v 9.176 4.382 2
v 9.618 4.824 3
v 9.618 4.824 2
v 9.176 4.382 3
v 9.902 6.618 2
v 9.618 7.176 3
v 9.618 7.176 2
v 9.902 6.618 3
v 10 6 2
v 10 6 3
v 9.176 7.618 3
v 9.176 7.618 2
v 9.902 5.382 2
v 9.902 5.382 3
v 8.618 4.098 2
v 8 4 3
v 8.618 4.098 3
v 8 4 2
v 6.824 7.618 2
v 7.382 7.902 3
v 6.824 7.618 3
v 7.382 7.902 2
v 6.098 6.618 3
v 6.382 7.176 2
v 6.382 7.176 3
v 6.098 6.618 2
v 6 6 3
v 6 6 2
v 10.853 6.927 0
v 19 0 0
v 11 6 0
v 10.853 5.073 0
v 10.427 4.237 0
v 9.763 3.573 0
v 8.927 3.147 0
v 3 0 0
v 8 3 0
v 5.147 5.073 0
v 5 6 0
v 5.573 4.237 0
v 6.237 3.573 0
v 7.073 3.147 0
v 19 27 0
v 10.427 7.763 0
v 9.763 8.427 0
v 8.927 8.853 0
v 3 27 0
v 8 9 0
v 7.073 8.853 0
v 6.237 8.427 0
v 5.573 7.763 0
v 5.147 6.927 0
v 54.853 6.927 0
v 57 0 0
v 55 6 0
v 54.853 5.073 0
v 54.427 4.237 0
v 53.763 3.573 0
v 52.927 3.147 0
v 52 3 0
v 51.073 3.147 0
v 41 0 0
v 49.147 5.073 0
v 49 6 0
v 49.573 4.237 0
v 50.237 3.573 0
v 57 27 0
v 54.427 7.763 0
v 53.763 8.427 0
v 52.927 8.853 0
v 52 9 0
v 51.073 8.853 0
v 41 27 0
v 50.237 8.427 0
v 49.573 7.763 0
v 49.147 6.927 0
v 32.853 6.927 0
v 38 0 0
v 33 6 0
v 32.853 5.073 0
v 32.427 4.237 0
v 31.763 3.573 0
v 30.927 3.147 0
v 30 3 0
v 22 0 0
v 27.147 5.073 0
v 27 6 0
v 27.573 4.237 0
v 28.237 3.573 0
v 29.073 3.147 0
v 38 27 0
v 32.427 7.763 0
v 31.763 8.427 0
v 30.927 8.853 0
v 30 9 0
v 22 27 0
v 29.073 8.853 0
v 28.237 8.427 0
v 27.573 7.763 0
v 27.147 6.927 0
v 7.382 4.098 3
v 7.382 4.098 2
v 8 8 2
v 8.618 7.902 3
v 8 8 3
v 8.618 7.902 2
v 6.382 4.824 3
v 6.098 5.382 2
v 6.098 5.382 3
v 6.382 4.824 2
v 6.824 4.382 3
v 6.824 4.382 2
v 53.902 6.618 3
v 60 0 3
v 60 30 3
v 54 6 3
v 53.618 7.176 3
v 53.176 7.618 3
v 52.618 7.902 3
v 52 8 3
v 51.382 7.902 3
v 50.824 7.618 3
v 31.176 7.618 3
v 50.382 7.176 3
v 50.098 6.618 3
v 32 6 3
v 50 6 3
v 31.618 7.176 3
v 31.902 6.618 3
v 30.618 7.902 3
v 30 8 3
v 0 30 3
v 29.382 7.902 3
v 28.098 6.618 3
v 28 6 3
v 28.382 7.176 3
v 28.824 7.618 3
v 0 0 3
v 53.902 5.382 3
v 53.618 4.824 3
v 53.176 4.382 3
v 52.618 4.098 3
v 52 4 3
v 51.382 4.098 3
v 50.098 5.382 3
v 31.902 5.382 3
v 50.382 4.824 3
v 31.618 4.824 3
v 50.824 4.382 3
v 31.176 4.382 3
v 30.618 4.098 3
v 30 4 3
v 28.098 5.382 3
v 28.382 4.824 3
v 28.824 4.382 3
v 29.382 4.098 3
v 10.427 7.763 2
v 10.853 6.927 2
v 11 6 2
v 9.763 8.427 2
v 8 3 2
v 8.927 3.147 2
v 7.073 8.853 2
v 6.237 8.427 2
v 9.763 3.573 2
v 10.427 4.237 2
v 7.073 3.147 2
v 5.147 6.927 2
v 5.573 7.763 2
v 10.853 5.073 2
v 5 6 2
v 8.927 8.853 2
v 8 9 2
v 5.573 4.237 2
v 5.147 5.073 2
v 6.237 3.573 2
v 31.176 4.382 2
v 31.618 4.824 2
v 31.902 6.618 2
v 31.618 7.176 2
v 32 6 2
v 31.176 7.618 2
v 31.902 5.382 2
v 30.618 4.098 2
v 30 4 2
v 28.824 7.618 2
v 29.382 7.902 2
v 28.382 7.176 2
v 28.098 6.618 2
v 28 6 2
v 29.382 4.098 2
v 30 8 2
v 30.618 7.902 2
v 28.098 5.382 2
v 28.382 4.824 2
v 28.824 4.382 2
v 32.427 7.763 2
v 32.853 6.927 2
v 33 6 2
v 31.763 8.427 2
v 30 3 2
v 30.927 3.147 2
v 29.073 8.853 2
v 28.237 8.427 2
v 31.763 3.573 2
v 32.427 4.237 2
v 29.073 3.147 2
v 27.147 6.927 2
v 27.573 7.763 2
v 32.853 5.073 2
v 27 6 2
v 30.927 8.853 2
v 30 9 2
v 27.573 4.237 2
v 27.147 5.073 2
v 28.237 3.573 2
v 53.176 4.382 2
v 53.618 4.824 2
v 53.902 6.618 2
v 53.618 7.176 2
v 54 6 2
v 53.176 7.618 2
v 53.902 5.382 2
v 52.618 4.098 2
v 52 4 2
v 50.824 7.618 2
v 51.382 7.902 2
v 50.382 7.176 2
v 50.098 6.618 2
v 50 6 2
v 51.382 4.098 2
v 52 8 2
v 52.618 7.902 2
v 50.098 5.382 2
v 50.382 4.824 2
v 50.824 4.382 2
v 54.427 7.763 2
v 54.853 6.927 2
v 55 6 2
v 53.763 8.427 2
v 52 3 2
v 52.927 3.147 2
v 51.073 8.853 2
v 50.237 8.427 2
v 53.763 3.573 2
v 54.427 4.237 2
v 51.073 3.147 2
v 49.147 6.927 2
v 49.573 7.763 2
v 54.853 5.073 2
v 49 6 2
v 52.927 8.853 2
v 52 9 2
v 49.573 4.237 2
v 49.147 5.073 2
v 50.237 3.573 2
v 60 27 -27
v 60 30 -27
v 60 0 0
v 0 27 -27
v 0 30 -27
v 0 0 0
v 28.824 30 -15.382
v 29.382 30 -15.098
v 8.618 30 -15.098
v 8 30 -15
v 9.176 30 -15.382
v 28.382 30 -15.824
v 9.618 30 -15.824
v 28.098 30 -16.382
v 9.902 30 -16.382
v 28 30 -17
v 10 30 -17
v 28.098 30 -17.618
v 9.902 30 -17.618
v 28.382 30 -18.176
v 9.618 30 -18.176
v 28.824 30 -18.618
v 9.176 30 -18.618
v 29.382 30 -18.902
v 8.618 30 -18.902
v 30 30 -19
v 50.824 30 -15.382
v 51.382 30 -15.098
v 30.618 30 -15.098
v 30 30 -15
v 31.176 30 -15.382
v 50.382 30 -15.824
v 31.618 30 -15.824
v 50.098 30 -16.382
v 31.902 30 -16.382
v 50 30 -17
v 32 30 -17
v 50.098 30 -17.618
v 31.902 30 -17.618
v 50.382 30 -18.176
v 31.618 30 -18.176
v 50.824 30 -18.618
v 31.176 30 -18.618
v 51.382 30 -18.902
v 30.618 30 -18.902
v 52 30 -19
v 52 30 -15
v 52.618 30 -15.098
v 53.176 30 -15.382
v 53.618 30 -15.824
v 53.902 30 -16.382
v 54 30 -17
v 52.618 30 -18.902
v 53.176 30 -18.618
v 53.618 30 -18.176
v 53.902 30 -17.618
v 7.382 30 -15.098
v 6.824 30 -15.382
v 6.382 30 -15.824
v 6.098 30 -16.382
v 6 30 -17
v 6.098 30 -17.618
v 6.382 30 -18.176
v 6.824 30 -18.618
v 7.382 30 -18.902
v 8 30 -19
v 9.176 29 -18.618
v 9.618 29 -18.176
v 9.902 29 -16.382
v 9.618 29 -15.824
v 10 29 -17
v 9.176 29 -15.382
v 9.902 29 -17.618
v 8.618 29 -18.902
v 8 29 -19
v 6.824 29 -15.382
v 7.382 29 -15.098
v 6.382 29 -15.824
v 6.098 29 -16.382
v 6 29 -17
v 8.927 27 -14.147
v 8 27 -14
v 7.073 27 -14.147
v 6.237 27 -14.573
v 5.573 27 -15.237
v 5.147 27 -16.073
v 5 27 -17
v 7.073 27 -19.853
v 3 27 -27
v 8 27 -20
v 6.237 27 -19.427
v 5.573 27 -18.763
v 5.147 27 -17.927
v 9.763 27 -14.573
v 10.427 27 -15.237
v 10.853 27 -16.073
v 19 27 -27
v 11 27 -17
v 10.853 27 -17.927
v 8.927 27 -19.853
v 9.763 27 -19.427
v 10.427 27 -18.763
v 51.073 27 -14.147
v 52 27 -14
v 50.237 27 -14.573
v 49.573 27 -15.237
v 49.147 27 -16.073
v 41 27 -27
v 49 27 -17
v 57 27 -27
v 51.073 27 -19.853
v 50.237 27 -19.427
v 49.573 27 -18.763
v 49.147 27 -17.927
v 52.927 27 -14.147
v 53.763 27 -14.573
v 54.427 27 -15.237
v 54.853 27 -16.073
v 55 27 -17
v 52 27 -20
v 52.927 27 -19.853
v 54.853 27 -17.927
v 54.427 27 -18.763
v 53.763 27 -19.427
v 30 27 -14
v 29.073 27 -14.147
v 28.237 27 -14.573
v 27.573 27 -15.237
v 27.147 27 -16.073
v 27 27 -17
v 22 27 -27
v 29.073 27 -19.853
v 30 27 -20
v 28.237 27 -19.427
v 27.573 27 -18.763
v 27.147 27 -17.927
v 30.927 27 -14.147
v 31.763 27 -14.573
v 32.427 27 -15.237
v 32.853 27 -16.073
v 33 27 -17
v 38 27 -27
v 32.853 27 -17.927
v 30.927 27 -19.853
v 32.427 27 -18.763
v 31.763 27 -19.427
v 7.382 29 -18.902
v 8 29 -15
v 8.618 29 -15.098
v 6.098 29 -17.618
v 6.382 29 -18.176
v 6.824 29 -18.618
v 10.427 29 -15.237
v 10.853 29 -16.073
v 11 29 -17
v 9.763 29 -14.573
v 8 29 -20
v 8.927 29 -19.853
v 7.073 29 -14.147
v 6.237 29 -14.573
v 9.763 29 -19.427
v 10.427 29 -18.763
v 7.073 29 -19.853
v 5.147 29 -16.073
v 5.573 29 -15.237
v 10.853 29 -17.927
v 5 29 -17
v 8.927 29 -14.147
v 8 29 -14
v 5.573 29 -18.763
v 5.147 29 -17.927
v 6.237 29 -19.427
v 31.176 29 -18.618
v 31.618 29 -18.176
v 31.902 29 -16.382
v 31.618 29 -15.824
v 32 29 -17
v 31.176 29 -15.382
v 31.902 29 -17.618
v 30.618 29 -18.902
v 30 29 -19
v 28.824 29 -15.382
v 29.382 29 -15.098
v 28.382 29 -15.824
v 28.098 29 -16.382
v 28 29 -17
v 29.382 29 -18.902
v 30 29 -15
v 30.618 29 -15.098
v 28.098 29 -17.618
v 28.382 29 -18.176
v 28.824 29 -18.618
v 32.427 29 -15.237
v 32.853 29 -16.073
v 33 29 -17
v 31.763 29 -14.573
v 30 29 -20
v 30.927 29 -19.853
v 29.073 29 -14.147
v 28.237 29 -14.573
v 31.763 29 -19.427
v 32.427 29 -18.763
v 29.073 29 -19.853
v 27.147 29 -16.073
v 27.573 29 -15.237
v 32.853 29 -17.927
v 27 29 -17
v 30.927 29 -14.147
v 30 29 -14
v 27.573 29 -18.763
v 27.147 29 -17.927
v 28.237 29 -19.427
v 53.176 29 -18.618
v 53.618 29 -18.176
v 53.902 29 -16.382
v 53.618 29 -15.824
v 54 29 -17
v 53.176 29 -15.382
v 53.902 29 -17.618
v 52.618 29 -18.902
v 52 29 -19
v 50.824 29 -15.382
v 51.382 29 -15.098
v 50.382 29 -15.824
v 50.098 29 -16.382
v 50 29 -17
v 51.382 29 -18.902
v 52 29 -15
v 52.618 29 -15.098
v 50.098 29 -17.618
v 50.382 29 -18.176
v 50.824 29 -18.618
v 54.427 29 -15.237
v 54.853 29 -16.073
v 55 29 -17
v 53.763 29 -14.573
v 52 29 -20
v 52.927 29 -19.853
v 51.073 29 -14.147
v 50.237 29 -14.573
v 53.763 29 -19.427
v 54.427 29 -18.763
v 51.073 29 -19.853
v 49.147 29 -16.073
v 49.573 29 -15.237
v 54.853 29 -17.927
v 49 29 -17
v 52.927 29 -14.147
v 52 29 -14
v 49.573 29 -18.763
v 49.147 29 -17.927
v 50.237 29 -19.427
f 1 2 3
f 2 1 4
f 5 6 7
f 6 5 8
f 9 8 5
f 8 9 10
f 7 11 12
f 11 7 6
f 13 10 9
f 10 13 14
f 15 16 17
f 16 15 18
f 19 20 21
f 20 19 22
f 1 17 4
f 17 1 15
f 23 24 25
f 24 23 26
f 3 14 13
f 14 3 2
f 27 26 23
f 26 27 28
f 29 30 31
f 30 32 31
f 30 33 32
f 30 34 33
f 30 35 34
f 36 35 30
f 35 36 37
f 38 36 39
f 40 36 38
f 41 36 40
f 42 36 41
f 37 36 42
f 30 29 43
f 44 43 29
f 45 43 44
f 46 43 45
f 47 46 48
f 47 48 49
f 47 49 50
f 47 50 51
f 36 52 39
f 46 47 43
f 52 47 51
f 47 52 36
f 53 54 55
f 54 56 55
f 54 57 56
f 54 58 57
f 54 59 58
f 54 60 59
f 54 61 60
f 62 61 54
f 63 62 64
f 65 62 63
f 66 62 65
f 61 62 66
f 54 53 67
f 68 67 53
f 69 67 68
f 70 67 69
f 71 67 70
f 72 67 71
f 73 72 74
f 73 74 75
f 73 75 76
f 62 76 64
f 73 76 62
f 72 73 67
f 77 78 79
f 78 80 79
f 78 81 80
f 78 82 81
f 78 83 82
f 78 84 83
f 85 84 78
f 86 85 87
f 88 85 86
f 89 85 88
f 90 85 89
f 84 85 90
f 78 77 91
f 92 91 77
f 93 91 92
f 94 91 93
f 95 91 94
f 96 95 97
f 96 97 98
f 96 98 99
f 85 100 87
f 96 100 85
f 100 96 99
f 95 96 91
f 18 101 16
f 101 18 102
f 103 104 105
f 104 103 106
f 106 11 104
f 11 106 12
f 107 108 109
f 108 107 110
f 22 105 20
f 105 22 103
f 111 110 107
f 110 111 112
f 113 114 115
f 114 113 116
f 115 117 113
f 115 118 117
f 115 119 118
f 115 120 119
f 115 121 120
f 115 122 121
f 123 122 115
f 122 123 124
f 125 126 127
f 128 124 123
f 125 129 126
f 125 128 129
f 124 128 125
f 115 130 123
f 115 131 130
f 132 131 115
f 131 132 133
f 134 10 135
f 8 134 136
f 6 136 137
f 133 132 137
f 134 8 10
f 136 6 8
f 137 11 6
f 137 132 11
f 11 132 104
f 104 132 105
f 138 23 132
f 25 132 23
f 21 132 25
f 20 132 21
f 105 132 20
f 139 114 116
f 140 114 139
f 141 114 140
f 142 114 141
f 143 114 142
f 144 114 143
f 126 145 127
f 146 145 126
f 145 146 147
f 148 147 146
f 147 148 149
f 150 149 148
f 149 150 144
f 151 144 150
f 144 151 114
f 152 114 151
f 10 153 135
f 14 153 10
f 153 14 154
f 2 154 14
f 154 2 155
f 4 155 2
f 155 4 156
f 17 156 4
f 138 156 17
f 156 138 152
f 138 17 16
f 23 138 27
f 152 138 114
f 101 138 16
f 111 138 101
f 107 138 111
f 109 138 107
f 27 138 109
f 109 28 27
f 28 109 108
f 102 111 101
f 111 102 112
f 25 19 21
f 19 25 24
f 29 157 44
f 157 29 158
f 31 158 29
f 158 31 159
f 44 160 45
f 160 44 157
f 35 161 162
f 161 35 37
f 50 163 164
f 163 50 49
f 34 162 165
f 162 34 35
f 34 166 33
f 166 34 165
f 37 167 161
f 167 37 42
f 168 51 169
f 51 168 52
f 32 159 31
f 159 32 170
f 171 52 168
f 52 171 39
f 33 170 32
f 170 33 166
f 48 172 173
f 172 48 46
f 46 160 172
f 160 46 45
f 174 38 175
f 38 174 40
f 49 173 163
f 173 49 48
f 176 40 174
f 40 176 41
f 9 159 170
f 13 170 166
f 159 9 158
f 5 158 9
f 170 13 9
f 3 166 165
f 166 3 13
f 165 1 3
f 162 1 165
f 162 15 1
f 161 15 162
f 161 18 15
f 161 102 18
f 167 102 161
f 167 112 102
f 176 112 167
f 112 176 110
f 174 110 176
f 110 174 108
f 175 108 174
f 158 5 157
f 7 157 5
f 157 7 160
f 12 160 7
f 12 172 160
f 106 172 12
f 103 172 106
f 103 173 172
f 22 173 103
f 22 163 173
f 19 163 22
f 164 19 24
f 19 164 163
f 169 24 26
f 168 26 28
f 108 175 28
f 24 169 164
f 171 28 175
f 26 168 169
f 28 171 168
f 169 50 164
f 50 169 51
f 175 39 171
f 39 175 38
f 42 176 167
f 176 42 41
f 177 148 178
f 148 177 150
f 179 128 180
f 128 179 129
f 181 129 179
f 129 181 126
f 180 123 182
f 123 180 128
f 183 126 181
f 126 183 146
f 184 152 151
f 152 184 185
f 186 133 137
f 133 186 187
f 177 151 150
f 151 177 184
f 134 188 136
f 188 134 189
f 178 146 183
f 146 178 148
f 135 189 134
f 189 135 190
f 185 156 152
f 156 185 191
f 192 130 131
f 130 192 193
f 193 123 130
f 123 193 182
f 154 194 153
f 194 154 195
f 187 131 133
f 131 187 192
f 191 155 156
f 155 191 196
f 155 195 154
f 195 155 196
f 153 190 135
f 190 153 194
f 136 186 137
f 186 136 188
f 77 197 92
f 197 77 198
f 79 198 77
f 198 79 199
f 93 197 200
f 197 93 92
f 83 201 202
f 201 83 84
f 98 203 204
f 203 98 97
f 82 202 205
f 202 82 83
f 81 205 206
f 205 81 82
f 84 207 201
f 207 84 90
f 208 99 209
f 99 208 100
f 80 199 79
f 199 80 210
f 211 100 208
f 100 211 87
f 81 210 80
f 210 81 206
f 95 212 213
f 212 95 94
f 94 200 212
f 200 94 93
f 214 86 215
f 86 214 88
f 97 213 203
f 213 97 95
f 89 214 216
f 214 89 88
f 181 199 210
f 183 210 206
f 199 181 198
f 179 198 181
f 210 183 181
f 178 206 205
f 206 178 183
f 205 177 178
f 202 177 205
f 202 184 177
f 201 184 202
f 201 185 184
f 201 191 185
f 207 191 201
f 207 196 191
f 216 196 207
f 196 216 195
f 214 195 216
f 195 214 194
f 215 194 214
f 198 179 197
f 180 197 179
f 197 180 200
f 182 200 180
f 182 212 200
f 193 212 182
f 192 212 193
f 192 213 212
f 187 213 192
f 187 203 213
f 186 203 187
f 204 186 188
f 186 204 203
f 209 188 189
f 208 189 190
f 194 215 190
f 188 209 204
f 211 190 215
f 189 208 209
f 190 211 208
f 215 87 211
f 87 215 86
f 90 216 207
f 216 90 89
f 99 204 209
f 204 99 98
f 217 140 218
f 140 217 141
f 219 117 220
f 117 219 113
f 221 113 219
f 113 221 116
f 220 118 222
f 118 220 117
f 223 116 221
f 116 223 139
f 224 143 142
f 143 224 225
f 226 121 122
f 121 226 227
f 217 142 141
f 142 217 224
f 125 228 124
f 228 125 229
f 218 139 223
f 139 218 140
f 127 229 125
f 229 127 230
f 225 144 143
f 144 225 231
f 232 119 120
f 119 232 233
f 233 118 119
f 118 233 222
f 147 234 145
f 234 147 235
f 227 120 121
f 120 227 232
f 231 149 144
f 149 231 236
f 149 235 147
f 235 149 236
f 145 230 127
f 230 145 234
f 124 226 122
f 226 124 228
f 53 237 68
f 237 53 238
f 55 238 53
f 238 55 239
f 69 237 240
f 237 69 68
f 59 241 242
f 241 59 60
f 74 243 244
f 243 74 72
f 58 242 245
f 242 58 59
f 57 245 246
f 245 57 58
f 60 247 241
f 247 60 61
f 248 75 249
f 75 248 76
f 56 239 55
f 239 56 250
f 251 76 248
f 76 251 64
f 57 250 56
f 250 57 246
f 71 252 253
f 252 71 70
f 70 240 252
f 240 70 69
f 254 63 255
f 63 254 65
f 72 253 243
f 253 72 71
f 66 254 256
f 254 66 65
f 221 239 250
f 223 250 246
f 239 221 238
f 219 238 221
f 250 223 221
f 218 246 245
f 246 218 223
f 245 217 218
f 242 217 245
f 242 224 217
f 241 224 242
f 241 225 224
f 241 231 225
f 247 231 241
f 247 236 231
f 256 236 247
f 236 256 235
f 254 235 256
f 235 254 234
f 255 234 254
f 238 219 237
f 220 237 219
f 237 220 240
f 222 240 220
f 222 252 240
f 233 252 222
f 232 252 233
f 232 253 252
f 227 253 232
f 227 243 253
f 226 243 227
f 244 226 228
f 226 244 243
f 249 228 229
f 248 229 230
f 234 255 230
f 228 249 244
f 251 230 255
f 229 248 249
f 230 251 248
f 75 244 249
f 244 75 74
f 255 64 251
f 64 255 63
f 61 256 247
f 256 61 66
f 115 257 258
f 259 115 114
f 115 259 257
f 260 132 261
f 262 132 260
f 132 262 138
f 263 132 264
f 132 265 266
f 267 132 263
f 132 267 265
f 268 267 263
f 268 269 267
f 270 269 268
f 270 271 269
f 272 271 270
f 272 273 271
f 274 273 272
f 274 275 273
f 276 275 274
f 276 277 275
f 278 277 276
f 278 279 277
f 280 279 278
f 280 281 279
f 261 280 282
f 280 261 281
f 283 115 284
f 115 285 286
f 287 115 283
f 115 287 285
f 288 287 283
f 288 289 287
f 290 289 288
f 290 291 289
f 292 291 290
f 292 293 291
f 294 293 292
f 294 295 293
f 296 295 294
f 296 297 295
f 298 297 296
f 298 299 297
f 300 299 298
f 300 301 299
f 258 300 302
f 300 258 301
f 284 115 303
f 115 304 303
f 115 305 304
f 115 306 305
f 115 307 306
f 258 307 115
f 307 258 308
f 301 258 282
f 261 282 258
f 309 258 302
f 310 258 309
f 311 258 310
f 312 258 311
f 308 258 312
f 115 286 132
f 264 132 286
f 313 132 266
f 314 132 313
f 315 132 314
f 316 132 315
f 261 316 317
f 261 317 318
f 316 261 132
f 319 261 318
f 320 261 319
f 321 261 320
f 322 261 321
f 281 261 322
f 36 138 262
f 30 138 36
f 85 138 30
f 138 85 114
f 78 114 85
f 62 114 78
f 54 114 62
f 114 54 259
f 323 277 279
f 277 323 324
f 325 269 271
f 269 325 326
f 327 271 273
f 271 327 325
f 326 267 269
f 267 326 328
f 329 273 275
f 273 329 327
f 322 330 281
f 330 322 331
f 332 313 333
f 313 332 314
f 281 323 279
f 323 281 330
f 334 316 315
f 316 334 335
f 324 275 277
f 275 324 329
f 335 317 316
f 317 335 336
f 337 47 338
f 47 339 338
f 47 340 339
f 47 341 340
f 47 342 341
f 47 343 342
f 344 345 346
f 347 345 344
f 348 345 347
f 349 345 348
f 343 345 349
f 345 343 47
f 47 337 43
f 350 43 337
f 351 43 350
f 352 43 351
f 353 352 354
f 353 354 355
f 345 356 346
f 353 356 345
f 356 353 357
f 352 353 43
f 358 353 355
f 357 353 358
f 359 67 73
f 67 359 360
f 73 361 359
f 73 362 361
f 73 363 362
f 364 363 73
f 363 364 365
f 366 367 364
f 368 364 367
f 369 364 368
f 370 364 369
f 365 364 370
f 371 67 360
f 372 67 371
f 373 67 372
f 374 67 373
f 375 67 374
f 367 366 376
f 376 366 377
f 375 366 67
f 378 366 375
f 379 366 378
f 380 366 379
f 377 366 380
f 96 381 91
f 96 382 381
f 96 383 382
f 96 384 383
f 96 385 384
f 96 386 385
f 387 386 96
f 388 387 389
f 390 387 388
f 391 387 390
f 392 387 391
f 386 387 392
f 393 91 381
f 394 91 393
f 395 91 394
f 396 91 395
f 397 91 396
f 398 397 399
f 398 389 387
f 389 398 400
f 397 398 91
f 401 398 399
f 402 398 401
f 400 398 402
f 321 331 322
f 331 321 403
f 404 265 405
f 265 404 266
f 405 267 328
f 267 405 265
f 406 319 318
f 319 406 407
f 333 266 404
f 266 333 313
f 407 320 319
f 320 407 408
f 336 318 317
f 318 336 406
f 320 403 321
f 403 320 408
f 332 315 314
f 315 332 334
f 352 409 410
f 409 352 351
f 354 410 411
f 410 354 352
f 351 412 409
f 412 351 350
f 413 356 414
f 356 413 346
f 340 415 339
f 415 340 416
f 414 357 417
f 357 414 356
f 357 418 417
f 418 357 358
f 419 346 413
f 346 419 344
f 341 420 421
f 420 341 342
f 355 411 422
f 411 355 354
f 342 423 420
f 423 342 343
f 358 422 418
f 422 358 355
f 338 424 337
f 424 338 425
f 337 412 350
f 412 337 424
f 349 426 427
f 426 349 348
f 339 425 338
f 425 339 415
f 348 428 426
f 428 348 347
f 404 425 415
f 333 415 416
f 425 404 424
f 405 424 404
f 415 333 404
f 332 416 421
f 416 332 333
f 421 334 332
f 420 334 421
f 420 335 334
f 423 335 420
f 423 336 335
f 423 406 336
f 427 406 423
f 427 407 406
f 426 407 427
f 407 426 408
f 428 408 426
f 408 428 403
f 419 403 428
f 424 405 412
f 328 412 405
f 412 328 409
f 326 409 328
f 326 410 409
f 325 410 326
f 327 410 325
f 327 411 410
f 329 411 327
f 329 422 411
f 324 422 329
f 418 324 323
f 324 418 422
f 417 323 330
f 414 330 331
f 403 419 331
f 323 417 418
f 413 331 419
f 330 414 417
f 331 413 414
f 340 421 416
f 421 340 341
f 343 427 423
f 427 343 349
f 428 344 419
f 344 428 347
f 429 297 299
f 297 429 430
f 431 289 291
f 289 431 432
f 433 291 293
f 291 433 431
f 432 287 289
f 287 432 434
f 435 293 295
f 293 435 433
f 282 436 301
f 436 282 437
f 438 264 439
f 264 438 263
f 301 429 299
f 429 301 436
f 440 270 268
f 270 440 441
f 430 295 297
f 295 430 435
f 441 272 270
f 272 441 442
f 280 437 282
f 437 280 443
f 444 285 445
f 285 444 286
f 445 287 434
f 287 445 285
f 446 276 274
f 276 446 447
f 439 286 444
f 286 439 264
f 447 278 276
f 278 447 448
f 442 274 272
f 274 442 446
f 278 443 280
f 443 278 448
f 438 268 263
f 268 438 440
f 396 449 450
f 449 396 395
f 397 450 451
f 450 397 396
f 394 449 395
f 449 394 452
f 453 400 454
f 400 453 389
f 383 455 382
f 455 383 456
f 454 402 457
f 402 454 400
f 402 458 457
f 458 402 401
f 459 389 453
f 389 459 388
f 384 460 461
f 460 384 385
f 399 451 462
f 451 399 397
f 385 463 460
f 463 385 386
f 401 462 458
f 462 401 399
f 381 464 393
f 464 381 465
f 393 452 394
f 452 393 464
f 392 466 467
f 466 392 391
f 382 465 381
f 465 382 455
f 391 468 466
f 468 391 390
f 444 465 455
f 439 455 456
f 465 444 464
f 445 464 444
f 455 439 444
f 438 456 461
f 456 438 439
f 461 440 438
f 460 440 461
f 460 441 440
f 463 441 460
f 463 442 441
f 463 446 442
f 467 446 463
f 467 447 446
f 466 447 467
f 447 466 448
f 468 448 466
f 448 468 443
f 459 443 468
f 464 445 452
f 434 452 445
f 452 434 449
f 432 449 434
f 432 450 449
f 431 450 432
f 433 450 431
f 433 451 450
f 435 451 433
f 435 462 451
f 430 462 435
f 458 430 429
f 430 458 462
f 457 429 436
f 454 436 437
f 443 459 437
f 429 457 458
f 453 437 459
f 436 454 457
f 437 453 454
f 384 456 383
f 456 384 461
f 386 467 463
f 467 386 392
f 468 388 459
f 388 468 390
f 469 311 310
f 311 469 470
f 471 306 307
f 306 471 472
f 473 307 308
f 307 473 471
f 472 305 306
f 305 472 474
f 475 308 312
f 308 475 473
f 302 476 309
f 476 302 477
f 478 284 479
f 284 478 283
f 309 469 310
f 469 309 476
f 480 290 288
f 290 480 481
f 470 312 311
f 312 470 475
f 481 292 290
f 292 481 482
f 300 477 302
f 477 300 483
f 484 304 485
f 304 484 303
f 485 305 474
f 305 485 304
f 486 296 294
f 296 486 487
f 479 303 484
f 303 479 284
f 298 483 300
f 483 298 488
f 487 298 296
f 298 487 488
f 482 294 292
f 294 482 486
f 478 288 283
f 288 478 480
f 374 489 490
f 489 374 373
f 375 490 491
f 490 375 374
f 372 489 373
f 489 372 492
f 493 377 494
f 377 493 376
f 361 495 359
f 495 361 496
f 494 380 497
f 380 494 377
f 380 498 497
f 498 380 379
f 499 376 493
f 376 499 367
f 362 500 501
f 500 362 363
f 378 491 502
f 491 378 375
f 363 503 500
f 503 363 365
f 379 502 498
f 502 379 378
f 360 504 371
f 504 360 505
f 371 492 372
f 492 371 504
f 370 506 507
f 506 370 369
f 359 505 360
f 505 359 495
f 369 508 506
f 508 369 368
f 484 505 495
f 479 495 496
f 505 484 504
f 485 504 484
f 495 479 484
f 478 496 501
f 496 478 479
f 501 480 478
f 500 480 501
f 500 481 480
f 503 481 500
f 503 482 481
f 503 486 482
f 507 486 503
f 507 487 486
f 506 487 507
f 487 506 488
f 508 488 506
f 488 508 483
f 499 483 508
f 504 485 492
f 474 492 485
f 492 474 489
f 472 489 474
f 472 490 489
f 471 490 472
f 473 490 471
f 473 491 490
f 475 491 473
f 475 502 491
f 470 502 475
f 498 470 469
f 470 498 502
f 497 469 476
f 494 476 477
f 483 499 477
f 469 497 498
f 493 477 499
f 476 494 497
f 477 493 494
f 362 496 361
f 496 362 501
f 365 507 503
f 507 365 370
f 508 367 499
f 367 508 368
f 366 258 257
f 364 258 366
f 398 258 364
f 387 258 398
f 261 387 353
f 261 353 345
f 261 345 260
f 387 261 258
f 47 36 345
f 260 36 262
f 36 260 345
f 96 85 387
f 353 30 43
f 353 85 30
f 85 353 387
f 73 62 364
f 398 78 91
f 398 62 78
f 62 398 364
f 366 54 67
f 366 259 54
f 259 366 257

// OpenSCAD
//new winkel

// ************* Declaration part *************

// material strength
thickness=3;

//width of the angle
width=60;

//each side can be tuned to its own length
y_lenght1=30;
y_lenght2=30;

//amount of screws vertical
screws_y_vertical=1;

//amount of screws horizontal
screws_x_horizontal=3;

// campher of side 1
screw_campher_side1="inside";  //[outside:Outside, inside:Inside , none:None ]

//campher of side 2
screw_campher_side2="inside";  //[outside:Outside, inside:Inside , none:None ]

screw_campher_radius=3;
screw_campher_height=2;
screw_campher_radius_lower=3; //set this value equal to "screw_campher_radius" or "screw_radius". Setting it to screw_radius wil lcreate a campher, setting it to "screw_campher_radius" will create a cylindric hole 

screw_distance_border_left_right=8; // important: if only 1 screw vertical is set, then this valus defines where this single screw is set. if you want it in the middle, then set it to "width/2"
screw_distance_top=10;
screw_distance_bottom1=6; // important: if only 1 screw horizontal is set, then this valus defines where this single screw is set. if you want it in the middle, then set it to "y_lenght1/2"
screw_distance_bottom2=10; // important: if only 1 screw horizontal is set, then this valus defines where this single screw is set. if you want it in the middle, then set it to "y_lenght1/2"
screw_radius=2;
amount_extra_strong=4;  // set higher value as zero to make extra strong
extra_strong_thickness=3;



module extra_stark () {
    step = (amount_extra_strong>1) ? (width-amount_extra_strong*extra_strong_thickness)/(amount_extra_strong-1):1;

    
    d=[[0,0],[y_lenght2-thickness,0],[0,y_lenght1-thickness]];
    for (x=[0:amount_extra_strong-1])
            translate ([x*(step+extra_strong_thickness)+extra_strong_thickness,y_lenght1-thickness,0]) 
                rotate ([0,90,180]) 
                linear_extrude (height=extra_strong_thickness) polygon (d);
}



module side (lenght,campher,screw_distance_bottom) {
    difference () {
    screw_step_y = (screws_y_vertical>1) ? (lenght-screw_distance_top-screw_distance_bottom)/(screws_y_vertical-1):0;
    screw_step_x = (screws_x_horizontal>1) ? (width-2*screw_distance_border_left_right)/(screws_x_horizontal-1):0;
    echo ("length",lenght,"width",width,"screw_step_y",screw_step_y,"screw_step_x",screw_step_x);
    cube ([width,lenght,thickness]);
    
    for (y=[0:screws_y_vertical-1])
         for (x=[0:screws_x_horizontal-1]) {
             echo (lenght,y,x);
            translate ([screw_distance_border_left_right+x*screw_step_x,screw_distance_bottom+y*screw_step_y,0]) 
                {
                    //screw
                    cylinder (r=screw_radius,h=thickness,$fn=20);
                    //campher
                    if (campher=="outside") translate ([0,0,thickness-screw_campher_height]) cylinder (r1=screw_campher_radius_lower,r2=screw_campher_radius,h=screw_campher_height,$fn=20);
                    if (campher=="inside") cylinder (r2=screw_campher_radius_lower,r1=screw_campher_radius,h=screw_campher_height,$fn=20);
                    } //end translate               
          } //end x-loop
    } //end diff
} //end

module winkel () {
    side (y_lenght1,screw_campher_side1,screw_distance_bottom1);
    translate ([0,y_lenght1-thickness,-y_lenght2+thickness]) mirror ([0,1,0]) rotate ([90,0,0]) side (y_lenght2,screw_campher_side2,screw_distance_bottom2);
}


//main
winkel ();
if (amount_extra_strong>0) extra_stark ();
